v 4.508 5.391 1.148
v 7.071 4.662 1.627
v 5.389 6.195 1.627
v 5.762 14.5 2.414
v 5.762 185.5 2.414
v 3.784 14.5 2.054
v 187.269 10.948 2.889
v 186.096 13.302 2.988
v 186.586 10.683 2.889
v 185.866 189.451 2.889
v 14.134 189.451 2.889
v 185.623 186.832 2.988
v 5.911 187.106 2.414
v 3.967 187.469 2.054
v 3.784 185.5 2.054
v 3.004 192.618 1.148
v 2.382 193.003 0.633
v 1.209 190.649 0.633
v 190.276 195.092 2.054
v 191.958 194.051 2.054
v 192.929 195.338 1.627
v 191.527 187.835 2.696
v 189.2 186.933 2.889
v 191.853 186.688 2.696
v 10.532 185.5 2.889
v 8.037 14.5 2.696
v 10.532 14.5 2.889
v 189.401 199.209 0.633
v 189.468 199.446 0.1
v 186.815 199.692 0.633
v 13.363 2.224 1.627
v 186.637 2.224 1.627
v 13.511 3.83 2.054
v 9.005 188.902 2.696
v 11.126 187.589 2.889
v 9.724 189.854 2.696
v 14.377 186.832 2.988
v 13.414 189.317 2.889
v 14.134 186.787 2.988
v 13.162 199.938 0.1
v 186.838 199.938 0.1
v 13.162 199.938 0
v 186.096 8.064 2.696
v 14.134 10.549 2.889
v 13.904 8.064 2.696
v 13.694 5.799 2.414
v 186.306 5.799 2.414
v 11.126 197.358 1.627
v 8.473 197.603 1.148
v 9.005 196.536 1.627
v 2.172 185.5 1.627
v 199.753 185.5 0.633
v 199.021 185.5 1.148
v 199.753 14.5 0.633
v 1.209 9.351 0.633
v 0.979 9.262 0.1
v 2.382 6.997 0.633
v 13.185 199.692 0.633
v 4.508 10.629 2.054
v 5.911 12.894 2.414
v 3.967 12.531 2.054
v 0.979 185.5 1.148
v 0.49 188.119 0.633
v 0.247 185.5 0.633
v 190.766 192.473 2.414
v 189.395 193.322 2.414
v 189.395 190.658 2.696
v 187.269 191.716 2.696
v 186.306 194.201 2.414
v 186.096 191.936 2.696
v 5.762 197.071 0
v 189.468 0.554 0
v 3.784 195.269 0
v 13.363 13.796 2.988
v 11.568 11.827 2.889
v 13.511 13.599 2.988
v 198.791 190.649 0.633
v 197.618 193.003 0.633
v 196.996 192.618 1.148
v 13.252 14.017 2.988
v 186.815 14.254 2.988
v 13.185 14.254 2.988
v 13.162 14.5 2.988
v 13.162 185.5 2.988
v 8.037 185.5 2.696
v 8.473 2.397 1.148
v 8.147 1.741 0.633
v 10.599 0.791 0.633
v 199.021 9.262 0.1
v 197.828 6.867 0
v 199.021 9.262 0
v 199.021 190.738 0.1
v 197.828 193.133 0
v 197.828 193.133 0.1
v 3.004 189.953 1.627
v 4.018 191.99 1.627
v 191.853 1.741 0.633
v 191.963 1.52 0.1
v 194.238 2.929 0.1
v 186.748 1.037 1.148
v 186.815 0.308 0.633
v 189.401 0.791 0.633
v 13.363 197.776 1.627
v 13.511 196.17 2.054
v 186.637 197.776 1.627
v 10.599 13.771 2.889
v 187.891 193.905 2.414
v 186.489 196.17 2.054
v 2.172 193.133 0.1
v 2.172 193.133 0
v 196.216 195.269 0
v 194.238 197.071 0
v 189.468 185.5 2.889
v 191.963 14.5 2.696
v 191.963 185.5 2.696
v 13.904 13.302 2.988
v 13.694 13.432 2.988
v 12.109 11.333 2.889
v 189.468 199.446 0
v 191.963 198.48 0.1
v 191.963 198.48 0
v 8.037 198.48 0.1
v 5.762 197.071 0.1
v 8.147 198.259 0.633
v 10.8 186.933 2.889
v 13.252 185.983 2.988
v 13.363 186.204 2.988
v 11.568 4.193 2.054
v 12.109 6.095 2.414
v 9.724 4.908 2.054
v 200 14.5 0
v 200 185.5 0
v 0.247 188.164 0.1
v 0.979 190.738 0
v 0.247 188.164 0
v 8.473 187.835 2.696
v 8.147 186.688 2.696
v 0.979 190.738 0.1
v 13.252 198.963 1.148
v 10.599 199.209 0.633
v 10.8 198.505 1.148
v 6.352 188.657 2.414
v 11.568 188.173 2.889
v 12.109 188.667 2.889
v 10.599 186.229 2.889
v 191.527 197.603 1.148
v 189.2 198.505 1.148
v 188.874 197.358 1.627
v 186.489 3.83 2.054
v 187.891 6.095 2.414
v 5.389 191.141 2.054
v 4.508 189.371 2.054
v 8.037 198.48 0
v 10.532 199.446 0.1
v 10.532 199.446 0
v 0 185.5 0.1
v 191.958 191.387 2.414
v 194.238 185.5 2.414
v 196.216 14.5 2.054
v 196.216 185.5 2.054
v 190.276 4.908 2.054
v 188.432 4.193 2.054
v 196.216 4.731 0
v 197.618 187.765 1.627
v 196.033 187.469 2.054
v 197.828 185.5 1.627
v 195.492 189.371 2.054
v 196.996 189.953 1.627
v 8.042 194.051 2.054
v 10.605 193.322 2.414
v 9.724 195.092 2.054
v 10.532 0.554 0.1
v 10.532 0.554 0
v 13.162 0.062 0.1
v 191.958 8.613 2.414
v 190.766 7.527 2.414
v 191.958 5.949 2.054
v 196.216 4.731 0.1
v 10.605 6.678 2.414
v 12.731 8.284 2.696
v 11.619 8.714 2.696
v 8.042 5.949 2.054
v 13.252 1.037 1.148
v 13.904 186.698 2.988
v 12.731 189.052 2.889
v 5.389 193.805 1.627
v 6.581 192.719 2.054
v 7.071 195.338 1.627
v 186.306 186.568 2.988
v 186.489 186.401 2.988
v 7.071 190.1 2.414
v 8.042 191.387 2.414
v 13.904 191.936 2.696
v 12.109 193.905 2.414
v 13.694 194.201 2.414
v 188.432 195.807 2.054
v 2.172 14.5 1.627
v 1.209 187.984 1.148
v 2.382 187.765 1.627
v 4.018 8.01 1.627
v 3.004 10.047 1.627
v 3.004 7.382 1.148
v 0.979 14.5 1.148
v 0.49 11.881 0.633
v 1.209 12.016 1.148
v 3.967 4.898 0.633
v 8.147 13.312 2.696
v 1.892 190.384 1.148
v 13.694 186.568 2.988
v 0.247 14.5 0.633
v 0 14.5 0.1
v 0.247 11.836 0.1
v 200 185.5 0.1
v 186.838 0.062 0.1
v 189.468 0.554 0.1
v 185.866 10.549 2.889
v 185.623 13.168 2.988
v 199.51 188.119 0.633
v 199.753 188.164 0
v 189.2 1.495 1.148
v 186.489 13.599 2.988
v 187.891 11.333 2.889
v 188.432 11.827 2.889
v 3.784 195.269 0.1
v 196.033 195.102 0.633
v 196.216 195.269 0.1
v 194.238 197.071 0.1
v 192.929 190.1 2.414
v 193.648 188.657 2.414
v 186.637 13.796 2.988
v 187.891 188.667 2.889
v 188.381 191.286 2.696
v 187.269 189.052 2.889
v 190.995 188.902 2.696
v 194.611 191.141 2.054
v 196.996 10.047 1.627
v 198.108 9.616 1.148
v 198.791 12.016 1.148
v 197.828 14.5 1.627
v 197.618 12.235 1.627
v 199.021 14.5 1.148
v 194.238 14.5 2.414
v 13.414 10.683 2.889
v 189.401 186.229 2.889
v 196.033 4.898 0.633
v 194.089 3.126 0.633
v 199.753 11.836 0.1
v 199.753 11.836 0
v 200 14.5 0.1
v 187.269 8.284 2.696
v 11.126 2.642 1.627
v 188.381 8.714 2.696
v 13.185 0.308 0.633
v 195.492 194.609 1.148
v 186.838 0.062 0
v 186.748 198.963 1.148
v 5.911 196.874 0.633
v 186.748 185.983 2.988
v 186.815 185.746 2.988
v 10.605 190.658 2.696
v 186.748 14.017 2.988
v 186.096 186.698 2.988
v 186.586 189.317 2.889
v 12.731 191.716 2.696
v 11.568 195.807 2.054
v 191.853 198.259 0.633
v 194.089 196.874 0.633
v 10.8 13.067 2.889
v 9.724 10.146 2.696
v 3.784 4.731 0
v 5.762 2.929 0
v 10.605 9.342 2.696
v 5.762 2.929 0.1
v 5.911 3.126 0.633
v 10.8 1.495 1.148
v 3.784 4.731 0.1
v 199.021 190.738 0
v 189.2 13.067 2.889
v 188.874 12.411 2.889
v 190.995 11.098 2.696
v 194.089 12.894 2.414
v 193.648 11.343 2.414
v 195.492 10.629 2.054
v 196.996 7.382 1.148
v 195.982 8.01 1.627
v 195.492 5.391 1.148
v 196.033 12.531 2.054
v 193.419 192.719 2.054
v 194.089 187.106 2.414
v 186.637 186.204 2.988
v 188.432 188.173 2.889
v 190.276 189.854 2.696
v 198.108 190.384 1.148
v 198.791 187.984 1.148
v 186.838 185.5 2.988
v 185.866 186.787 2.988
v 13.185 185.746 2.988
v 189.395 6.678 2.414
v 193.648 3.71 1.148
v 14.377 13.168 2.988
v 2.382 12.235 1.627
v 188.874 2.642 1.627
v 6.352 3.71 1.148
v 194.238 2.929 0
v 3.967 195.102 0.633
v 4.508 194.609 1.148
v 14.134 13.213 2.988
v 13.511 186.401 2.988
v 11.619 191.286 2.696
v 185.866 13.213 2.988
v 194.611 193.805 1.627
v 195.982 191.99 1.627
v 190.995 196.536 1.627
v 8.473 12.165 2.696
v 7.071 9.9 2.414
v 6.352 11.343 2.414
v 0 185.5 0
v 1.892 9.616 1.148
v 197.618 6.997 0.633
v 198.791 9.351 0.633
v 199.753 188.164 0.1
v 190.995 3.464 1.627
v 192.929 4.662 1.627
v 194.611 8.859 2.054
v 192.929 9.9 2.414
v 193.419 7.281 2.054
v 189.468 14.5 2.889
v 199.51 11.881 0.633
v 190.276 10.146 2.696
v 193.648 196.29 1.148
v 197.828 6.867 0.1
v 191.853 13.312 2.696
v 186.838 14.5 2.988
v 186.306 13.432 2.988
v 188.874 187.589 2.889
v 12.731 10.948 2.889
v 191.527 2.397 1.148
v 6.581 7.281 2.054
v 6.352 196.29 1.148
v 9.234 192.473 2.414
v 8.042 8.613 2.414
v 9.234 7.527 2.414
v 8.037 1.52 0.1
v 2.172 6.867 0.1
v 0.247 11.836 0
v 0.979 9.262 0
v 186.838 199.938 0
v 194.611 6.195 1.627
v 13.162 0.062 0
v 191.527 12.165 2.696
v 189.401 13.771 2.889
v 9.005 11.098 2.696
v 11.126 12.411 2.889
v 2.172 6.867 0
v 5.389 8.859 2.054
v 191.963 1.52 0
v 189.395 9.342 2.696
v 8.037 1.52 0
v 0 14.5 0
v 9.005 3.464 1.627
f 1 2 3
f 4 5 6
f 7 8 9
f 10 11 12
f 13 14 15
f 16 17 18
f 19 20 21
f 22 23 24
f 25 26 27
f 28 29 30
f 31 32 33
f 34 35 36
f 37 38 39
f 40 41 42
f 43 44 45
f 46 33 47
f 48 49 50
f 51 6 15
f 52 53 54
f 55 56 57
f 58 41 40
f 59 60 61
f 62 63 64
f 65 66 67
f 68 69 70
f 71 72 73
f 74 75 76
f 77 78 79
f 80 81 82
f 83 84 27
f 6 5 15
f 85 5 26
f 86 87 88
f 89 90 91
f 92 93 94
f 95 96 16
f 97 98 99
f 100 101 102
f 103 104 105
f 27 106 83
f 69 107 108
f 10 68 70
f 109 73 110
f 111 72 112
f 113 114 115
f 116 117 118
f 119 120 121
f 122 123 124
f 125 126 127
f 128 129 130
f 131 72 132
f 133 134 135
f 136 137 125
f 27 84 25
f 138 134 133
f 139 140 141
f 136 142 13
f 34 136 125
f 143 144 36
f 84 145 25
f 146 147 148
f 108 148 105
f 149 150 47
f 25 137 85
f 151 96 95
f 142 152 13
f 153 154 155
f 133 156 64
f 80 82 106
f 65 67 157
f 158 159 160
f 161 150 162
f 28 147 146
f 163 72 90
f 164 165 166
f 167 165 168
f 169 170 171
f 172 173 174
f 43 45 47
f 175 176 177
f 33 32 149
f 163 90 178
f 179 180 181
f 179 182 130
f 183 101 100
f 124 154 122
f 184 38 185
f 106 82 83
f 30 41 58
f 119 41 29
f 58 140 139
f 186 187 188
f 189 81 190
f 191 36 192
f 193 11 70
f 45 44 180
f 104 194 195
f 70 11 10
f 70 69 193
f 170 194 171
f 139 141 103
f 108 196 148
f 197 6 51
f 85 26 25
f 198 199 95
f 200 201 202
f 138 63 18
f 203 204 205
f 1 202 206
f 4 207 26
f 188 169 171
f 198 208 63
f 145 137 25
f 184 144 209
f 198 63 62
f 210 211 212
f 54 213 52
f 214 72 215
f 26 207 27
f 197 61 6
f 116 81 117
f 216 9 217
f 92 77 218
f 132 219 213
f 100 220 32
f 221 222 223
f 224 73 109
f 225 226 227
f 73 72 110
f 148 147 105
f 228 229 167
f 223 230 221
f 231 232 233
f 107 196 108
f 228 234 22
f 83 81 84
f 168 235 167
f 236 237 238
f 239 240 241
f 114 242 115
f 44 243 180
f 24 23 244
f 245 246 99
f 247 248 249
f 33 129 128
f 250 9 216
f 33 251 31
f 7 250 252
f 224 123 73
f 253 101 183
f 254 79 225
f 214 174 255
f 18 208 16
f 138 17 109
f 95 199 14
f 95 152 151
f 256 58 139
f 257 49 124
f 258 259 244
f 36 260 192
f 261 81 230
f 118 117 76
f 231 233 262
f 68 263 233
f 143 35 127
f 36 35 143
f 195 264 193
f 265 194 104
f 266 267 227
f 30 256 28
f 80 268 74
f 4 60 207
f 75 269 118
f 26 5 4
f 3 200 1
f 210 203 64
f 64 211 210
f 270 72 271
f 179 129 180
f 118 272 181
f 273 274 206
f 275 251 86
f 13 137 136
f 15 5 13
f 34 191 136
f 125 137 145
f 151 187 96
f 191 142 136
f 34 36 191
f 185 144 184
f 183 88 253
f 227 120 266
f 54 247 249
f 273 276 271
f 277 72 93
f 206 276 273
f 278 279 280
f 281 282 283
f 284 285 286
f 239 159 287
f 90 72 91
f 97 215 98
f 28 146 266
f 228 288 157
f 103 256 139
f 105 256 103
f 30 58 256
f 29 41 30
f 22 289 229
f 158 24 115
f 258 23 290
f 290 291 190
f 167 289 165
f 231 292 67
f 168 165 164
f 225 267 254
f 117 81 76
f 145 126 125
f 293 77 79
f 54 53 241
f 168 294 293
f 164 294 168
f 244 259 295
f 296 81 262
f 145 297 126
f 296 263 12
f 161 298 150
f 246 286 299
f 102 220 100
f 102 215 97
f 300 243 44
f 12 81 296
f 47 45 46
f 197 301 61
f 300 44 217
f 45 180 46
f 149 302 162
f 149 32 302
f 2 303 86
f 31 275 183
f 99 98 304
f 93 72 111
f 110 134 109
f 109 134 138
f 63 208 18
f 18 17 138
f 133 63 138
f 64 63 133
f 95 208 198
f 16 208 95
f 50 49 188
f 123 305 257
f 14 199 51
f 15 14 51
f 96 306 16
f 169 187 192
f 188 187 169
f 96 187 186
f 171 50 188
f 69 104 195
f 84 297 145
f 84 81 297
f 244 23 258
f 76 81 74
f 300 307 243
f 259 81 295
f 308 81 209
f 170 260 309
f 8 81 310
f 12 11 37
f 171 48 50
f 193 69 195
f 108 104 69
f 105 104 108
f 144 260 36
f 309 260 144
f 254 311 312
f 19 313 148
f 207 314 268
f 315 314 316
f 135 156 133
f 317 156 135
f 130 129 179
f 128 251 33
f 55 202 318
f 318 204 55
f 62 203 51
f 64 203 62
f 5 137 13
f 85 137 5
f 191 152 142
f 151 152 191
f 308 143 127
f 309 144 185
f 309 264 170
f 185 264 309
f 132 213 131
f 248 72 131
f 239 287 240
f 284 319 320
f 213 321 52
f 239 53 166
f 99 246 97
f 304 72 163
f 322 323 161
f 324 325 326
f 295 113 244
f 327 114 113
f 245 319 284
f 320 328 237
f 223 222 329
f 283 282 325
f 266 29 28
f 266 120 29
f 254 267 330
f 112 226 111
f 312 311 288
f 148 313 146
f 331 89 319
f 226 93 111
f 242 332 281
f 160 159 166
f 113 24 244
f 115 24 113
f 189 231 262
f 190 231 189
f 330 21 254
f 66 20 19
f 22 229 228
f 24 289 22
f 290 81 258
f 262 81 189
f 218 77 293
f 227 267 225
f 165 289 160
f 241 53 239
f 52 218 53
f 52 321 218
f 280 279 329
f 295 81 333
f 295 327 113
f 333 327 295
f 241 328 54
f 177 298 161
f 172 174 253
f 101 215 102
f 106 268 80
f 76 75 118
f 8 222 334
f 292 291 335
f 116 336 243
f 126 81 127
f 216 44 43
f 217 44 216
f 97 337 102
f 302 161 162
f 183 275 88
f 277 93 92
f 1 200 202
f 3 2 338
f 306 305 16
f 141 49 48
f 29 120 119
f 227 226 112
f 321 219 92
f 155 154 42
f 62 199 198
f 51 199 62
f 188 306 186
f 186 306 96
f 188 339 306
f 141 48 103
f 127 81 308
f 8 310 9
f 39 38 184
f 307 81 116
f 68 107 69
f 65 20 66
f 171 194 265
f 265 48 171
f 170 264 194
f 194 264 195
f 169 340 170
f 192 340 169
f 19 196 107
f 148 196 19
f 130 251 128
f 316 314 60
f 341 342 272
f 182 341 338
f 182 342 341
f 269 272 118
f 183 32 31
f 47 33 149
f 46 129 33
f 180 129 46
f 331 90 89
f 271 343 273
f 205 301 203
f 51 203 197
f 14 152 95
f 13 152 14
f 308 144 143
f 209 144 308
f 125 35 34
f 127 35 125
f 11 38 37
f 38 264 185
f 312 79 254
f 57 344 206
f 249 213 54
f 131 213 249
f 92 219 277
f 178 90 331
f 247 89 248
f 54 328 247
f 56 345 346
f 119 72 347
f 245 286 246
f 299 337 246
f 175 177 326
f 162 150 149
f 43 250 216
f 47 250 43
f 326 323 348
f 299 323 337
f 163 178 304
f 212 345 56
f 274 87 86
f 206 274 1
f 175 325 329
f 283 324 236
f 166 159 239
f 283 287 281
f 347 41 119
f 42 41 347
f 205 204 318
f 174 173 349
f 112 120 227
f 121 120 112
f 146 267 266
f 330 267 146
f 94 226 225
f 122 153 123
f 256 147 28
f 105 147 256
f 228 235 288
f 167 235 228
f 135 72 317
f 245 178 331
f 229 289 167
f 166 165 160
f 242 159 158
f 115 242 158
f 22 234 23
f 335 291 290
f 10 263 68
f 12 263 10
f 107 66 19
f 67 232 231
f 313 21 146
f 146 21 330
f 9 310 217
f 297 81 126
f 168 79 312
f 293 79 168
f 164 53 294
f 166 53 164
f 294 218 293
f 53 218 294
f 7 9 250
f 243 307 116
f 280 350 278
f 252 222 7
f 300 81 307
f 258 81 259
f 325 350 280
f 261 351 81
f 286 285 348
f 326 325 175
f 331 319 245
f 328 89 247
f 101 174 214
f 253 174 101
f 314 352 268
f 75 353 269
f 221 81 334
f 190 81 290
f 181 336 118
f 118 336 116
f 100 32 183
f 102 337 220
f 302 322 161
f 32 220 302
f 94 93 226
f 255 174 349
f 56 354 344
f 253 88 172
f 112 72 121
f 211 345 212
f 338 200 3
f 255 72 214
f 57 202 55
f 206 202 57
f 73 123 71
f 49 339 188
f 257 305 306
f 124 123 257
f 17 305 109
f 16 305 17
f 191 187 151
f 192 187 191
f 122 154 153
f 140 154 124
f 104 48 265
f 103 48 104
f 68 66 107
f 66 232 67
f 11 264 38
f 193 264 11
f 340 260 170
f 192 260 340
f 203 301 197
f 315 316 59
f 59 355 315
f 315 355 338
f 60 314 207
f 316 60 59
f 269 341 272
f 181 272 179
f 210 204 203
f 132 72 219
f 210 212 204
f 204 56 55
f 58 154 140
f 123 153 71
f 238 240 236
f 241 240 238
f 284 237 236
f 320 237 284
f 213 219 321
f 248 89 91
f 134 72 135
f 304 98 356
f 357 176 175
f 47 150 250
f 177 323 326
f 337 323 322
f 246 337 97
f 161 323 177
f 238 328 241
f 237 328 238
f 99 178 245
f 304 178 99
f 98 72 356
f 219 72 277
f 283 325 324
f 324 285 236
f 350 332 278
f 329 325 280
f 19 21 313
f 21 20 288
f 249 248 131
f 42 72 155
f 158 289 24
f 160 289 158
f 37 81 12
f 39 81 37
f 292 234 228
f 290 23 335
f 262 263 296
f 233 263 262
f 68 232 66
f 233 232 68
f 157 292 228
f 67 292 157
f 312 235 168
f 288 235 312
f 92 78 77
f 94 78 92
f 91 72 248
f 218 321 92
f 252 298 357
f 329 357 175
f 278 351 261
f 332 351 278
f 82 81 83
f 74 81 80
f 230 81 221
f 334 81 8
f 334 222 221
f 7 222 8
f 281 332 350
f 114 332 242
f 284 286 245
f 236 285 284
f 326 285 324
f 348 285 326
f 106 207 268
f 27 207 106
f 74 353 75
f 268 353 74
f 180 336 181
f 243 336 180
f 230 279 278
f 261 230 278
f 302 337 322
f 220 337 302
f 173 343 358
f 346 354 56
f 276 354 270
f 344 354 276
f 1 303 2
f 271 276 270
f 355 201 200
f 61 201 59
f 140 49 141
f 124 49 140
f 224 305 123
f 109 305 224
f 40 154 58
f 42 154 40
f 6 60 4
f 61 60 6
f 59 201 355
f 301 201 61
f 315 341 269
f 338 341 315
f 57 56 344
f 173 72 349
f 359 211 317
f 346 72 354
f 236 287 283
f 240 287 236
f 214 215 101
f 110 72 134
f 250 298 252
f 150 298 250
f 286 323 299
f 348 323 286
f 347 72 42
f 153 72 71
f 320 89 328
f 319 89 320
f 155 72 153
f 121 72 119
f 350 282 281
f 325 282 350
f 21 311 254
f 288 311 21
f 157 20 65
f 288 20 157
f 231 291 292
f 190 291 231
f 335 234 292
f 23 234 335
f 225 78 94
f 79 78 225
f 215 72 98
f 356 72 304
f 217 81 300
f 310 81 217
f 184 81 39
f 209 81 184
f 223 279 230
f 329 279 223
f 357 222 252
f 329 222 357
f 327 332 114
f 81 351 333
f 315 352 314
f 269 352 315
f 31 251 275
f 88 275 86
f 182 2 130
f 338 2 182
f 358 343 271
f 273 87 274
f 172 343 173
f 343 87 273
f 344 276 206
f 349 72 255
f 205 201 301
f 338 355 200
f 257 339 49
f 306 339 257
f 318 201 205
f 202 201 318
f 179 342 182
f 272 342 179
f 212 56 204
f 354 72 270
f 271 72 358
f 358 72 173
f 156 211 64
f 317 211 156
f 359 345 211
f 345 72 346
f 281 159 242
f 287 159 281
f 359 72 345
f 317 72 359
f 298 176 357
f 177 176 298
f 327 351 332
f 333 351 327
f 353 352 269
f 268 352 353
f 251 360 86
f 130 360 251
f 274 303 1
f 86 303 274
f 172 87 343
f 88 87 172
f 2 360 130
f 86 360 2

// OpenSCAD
x = 200;
r = 2.9;
m = 3;
s = 5;


//felgomb(r);

lapka();

module lapka(){
    translate([s*r,s*r,0])minkowski($fn=12*r){
        cube([x-2*s*r,x-2*s*r,m-r]);
        felgomb(r);
    }
}
module felgomb(r){
    difference(){
        scale([s,s,1])sphere(r, $fn=12*r);
        translate([-s*r,-s*r,-2*r])cube([2*s*r, 2*s*r, 2*r]);
    }
}
